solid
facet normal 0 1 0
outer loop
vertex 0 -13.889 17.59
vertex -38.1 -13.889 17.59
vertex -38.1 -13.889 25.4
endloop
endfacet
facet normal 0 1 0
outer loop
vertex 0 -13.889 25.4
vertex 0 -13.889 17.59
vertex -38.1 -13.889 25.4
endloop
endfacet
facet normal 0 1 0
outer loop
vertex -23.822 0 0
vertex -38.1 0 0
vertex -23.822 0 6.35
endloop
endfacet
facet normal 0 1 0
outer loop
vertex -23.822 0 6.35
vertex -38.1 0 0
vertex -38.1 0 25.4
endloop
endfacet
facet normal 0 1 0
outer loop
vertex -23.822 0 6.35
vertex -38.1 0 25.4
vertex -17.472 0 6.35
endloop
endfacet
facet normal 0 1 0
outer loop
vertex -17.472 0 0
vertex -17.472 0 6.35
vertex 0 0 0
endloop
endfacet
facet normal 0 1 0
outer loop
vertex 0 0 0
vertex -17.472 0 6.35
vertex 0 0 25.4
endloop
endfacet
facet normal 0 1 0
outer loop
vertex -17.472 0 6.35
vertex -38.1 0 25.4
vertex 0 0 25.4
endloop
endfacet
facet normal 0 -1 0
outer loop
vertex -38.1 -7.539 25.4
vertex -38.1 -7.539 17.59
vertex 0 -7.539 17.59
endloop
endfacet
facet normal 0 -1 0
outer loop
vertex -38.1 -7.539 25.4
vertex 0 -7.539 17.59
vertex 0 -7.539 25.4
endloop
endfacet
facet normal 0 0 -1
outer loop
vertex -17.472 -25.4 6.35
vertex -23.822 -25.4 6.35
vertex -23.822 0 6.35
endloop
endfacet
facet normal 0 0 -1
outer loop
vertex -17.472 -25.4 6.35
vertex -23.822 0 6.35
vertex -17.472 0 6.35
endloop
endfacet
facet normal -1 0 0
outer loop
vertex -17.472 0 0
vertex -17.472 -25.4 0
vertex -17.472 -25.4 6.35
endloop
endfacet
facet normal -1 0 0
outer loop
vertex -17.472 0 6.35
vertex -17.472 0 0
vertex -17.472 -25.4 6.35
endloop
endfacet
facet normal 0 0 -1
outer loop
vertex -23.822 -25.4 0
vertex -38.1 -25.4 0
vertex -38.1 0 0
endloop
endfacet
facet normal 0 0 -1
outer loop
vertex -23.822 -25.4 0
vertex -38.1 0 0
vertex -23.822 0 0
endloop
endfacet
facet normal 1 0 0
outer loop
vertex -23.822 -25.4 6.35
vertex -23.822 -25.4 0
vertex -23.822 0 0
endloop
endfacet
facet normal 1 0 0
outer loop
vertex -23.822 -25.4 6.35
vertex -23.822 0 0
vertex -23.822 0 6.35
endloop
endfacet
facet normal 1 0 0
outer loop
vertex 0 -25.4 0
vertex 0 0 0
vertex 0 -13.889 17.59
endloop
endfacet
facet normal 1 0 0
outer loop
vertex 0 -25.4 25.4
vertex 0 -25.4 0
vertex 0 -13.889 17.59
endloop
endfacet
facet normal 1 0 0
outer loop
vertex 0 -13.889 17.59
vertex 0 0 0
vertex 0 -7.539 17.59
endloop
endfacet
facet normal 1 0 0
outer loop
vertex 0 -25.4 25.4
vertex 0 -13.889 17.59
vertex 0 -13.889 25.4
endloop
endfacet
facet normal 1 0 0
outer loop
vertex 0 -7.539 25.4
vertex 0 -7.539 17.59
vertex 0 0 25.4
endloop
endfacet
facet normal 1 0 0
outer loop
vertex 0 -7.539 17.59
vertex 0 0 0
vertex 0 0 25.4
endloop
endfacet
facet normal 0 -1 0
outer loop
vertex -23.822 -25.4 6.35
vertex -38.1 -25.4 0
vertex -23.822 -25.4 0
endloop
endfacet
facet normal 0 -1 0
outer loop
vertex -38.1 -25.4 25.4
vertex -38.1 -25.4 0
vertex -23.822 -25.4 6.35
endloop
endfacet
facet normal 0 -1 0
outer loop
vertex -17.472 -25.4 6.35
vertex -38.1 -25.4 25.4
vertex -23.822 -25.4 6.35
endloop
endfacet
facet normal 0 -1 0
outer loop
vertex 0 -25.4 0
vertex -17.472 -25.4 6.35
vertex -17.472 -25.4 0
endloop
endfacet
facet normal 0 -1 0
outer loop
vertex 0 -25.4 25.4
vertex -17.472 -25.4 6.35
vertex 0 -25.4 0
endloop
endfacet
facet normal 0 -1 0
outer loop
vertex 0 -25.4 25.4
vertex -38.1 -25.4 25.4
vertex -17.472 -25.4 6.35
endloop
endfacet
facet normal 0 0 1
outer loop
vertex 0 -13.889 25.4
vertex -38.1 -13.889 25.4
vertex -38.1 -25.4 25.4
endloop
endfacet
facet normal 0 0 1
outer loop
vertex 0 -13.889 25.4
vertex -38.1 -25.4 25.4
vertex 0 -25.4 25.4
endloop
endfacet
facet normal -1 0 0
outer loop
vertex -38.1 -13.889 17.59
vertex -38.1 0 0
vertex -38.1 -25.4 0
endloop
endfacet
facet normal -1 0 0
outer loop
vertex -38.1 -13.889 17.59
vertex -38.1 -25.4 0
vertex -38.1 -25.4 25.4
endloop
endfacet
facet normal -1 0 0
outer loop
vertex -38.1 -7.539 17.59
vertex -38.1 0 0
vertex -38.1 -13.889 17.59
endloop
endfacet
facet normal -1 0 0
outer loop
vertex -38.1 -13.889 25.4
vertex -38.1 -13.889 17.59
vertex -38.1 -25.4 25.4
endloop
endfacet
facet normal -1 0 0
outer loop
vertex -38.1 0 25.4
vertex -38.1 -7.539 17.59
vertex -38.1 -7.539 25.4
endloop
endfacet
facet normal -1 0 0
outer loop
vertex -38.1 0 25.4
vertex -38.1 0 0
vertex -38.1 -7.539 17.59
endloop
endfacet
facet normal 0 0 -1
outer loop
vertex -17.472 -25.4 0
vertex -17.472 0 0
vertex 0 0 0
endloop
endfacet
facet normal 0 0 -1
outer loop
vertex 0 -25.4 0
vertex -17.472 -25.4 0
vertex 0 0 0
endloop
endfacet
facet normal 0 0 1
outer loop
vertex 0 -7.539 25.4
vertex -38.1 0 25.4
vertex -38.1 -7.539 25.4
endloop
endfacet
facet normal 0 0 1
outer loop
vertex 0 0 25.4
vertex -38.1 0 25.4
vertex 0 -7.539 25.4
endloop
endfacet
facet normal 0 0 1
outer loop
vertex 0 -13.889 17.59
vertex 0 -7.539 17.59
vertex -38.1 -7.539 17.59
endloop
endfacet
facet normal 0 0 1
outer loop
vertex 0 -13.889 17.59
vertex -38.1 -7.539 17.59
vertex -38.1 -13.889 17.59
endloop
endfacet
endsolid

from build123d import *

# Parameters (mm, degrees)
F0_W     = 38.1
F0_H     = 25.4
F1_DEPTH = 25.4
F3_W     = 6.35
F3_H     = 7.8098609388
F4_DEPTH = 38.101
F5_W     = 6.35
F5_H     = 6.35
F6_DEPTH = 25.401


with BuildPart() as f1:
    # F0 (on Front) → F1 (new body)
    with BuildSketch(Plane.XZ):
        with Locations((-19.05, 12.7)):
            Rectangle(F0_W, F0_H)
    extrude(amount=F1_DEPTH)

    # F3 (on face) → F4 (cut, through all)
    with BuildSketch(Plane(origin=(-38.1, 0, 0), x_dir=(0, -1, 0), z_dir=(-1, 0, 0))):
        with Locations((10.7136315584, 21.4950695306)):
            Rectangle(F3_W, F3_H)
    extrude(amount=-F4_DEPTH, mode=Mode.SUBTRACT)

    # F5 (on face) → F6 (cut, through all)
    with BuildSketch(Plane.XZ.offset(25.4)):
        with Locations((-20.6470728934, 3.175)):
            Rectangle(F5_W, F5_H)
    extrude(amount=-F6_DEPTH, mode=Mode.SUBTRACT)


solid = f1.part
